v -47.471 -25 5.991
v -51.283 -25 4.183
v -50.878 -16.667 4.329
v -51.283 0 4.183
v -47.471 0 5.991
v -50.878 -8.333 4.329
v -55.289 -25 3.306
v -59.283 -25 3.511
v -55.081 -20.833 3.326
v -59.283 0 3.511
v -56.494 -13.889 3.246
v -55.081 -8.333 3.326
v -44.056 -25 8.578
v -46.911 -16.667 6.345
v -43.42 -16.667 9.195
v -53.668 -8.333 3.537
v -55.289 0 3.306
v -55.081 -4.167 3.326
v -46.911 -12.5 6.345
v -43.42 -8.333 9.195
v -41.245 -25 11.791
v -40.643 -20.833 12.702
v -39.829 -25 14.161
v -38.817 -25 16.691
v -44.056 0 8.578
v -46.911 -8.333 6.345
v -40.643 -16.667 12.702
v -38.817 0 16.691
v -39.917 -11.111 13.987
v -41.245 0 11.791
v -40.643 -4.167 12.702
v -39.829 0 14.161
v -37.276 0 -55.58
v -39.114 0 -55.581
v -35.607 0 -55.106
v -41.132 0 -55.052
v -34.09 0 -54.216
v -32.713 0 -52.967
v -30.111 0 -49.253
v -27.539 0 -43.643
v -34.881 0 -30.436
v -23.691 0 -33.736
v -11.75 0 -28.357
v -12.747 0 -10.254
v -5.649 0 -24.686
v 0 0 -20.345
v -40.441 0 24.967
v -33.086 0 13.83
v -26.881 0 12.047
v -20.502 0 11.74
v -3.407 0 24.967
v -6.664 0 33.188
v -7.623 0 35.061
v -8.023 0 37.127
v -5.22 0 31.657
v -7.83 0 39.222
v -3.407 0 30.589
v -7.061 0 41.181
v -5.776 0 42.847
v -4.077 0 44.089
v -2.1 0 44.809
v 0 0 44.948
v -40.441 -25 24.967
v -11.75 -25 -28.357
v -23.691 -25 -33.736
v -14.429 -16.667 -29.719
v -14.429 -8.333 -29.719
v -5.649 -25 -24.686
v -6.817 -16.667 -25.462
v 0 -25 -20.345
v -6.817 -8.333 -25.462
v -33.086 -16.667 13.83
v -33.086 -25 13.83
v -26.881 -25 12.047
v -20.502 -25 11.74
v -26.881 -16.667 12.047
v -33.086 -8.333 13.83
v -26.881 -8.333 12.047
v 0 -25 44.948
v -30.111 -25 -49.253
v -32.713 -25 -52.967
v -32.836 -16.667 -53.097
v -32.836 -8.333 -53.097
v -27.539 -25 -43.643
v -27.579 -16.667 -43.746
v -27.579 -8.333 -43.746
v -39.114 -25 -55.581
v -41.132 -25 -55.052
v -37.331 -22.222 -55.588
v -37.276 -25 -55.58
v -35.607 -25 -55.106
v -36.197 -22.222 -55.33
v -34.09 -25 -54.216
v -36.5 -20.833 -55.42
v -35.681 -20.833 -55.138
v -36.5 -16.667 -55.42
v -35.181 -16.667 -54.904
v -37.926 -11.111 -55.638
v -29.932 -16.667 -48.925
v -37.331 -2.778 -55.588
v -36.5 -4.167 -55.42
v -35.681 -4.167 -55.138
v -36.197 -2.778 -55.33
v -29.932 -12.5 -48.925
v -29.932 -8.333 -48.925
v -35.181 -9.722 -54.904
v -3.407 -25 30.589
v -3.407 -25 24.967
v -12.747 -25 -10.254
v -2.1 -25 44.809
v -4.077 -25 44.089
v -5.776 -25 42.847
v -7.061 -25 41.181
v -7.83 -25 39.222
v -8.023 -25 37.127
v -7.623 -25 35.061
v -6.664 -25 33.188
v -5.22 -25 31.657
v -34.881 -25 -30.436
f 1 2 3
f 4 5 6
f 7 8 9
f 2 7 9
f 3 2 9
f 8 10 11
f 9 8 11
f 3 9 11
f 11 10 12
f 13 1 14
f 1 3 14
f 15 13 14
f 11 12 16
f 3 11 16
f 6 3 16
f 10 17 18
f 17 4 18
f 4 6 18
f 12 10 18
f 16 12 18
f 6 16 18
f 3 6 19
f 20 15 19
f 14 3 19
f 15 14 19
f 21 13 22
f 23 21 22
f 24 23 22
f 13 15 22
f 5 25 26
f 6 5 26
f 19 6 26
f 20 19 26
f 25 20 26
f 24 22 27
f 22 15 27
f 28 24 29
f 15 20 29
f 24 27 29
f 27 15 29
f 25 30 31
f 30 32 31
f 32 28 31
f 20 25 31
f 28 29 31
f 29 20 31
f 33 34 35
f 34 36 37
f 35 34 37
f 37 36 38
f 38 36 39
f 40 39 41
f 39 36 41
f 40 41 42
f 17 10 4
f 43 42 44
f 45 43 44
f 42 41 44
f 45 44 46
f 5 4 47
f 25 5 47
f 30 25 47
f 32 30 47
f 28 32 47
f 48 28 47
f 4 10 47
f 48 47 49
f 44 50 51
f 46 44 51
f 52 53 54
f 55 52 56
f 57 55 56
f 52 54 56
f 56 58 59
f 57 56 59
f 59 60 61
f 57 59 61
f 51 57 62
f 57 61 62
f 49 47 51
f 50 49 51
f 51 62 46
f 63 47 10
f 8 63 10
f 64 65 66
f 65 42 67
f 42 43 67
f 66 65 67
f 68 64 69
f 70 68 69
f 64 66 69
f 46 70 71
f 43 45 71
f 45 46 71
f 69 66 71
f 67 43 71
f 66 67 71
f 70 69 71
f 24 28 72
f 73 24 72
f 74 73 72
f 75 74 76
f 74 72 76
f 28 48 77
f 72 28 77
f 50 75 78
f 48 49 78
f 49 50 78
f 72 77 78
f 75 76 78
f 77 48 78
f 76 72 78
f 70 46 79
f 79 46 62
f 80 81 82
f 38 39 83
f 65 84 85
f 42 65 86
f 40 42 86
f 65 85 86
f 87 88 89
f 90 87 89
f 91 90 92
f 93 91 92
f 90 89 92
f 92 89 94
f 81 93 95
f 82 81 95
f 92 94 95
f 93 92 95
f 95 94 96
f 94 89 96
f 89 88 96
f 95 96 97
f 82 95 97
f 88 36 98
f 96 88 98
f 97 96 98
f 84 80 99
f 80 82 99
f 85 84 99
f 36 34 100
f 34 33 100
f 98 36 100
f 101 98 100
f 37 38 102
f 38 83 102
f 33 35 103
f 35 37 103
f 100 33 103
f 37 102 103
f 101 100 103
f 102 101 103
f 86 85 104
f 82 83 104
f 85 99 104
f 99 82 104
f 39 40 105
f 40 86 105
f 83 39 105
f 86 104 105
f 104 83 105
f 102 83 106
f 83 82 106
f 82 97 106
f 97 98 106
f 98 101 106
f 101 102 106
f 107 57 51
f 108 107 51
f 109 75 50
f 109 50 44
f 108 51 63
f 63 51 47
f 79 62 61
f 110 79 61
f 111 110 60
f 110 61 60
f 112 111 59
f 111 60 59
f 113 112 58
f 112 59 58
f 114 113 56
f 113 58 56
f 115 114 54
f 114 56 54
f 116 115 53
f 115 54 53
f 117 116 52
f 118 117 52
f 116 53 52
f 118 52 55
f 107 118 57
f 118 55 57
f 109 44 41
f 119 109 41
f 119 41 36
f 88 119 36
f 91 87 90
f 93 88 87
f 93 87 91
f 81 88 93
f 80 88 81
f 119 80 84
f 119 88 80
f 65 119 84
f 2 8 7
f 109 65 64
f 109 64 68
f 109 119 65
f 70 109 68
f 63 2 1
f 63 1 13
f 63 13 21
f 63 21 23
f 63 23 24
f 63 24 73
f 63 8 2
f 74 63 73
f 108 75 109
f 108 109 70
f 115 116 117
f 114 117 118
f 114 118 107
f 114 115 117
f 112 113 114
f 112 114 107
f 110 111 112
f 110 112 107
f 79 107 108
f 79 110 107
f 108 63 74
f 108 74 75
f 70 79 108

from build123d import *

# Parameters (mm, degrees)
F1_DEPTH = 25


with BuildPart() as f1:
    # F0 (on Front) → F1 (new body)
    with BuildSketch(Plane.XZ):
        with BuildLine():
            ThreePointArc((0, 44.947859), (-7.829862, 39.222287), (-3.407156, 30.589293))
            Line((-3.407156, 30.589293), (-3.407156, 24.967375))
            Line((-3.407156, 24.967375), (-40.440812, 24.967375))
            Line((-40.440812, 24.967375), (-59.282998, 3.510849))
            add(Edge.make_bspline(
                [(-59.282998, 3.510849), (-51.039223, 1.833404), (-41.357578, 8.351474), (-38.817345, 16.690769)],
                knots=[0, 0, 0, 0, 24.342418, 24.342418, 24.342418, 24.342418], degree=3))
            add(Edge.make_bspline(
                [(-38.817345, 16.690769), (-33.421371, 13.424438), (-26.868501, 11.176378), (-20.502377, 11.73953)],
                knots=[0, 0, 0, 0, 18.972422, 18.972422, 18.972422, 18.972422], degree=3))
            Line((-20.502377, 11.73953), (-12.747489, -10.253983))
            Line((-12.747489, -10.253983), (-34.881057, -30.43622))
            Line((-34.881057, -30.43622), (-41.132205, -55.052141))
            add(Edge.make_bspline(
                [(-41.132205, -55.052141), (-30.758676, -59.041798), (-27.452824, -41.829275), (-23.690994, -33.73597)],
                knots=[0, 0, 0, 0, 27.542239, 27.542239, 27.542239, 27.542239], degree=3))
            add(Edge.make_bspline(
                [(-23.690994, -33.73597), (-13.317464, -29.632323), (-6.705762, -26.098624), (0, -20.345102)],
                knots=[0, 0, 0, 0, 27.213573, 27.213573, 27.213573, 27.213573], degree=3))
            Line((0, -20.345102), (0, 44.947859))
        make_face()
    extrude(amount=F1_DEPTH)


solid = f1.part
